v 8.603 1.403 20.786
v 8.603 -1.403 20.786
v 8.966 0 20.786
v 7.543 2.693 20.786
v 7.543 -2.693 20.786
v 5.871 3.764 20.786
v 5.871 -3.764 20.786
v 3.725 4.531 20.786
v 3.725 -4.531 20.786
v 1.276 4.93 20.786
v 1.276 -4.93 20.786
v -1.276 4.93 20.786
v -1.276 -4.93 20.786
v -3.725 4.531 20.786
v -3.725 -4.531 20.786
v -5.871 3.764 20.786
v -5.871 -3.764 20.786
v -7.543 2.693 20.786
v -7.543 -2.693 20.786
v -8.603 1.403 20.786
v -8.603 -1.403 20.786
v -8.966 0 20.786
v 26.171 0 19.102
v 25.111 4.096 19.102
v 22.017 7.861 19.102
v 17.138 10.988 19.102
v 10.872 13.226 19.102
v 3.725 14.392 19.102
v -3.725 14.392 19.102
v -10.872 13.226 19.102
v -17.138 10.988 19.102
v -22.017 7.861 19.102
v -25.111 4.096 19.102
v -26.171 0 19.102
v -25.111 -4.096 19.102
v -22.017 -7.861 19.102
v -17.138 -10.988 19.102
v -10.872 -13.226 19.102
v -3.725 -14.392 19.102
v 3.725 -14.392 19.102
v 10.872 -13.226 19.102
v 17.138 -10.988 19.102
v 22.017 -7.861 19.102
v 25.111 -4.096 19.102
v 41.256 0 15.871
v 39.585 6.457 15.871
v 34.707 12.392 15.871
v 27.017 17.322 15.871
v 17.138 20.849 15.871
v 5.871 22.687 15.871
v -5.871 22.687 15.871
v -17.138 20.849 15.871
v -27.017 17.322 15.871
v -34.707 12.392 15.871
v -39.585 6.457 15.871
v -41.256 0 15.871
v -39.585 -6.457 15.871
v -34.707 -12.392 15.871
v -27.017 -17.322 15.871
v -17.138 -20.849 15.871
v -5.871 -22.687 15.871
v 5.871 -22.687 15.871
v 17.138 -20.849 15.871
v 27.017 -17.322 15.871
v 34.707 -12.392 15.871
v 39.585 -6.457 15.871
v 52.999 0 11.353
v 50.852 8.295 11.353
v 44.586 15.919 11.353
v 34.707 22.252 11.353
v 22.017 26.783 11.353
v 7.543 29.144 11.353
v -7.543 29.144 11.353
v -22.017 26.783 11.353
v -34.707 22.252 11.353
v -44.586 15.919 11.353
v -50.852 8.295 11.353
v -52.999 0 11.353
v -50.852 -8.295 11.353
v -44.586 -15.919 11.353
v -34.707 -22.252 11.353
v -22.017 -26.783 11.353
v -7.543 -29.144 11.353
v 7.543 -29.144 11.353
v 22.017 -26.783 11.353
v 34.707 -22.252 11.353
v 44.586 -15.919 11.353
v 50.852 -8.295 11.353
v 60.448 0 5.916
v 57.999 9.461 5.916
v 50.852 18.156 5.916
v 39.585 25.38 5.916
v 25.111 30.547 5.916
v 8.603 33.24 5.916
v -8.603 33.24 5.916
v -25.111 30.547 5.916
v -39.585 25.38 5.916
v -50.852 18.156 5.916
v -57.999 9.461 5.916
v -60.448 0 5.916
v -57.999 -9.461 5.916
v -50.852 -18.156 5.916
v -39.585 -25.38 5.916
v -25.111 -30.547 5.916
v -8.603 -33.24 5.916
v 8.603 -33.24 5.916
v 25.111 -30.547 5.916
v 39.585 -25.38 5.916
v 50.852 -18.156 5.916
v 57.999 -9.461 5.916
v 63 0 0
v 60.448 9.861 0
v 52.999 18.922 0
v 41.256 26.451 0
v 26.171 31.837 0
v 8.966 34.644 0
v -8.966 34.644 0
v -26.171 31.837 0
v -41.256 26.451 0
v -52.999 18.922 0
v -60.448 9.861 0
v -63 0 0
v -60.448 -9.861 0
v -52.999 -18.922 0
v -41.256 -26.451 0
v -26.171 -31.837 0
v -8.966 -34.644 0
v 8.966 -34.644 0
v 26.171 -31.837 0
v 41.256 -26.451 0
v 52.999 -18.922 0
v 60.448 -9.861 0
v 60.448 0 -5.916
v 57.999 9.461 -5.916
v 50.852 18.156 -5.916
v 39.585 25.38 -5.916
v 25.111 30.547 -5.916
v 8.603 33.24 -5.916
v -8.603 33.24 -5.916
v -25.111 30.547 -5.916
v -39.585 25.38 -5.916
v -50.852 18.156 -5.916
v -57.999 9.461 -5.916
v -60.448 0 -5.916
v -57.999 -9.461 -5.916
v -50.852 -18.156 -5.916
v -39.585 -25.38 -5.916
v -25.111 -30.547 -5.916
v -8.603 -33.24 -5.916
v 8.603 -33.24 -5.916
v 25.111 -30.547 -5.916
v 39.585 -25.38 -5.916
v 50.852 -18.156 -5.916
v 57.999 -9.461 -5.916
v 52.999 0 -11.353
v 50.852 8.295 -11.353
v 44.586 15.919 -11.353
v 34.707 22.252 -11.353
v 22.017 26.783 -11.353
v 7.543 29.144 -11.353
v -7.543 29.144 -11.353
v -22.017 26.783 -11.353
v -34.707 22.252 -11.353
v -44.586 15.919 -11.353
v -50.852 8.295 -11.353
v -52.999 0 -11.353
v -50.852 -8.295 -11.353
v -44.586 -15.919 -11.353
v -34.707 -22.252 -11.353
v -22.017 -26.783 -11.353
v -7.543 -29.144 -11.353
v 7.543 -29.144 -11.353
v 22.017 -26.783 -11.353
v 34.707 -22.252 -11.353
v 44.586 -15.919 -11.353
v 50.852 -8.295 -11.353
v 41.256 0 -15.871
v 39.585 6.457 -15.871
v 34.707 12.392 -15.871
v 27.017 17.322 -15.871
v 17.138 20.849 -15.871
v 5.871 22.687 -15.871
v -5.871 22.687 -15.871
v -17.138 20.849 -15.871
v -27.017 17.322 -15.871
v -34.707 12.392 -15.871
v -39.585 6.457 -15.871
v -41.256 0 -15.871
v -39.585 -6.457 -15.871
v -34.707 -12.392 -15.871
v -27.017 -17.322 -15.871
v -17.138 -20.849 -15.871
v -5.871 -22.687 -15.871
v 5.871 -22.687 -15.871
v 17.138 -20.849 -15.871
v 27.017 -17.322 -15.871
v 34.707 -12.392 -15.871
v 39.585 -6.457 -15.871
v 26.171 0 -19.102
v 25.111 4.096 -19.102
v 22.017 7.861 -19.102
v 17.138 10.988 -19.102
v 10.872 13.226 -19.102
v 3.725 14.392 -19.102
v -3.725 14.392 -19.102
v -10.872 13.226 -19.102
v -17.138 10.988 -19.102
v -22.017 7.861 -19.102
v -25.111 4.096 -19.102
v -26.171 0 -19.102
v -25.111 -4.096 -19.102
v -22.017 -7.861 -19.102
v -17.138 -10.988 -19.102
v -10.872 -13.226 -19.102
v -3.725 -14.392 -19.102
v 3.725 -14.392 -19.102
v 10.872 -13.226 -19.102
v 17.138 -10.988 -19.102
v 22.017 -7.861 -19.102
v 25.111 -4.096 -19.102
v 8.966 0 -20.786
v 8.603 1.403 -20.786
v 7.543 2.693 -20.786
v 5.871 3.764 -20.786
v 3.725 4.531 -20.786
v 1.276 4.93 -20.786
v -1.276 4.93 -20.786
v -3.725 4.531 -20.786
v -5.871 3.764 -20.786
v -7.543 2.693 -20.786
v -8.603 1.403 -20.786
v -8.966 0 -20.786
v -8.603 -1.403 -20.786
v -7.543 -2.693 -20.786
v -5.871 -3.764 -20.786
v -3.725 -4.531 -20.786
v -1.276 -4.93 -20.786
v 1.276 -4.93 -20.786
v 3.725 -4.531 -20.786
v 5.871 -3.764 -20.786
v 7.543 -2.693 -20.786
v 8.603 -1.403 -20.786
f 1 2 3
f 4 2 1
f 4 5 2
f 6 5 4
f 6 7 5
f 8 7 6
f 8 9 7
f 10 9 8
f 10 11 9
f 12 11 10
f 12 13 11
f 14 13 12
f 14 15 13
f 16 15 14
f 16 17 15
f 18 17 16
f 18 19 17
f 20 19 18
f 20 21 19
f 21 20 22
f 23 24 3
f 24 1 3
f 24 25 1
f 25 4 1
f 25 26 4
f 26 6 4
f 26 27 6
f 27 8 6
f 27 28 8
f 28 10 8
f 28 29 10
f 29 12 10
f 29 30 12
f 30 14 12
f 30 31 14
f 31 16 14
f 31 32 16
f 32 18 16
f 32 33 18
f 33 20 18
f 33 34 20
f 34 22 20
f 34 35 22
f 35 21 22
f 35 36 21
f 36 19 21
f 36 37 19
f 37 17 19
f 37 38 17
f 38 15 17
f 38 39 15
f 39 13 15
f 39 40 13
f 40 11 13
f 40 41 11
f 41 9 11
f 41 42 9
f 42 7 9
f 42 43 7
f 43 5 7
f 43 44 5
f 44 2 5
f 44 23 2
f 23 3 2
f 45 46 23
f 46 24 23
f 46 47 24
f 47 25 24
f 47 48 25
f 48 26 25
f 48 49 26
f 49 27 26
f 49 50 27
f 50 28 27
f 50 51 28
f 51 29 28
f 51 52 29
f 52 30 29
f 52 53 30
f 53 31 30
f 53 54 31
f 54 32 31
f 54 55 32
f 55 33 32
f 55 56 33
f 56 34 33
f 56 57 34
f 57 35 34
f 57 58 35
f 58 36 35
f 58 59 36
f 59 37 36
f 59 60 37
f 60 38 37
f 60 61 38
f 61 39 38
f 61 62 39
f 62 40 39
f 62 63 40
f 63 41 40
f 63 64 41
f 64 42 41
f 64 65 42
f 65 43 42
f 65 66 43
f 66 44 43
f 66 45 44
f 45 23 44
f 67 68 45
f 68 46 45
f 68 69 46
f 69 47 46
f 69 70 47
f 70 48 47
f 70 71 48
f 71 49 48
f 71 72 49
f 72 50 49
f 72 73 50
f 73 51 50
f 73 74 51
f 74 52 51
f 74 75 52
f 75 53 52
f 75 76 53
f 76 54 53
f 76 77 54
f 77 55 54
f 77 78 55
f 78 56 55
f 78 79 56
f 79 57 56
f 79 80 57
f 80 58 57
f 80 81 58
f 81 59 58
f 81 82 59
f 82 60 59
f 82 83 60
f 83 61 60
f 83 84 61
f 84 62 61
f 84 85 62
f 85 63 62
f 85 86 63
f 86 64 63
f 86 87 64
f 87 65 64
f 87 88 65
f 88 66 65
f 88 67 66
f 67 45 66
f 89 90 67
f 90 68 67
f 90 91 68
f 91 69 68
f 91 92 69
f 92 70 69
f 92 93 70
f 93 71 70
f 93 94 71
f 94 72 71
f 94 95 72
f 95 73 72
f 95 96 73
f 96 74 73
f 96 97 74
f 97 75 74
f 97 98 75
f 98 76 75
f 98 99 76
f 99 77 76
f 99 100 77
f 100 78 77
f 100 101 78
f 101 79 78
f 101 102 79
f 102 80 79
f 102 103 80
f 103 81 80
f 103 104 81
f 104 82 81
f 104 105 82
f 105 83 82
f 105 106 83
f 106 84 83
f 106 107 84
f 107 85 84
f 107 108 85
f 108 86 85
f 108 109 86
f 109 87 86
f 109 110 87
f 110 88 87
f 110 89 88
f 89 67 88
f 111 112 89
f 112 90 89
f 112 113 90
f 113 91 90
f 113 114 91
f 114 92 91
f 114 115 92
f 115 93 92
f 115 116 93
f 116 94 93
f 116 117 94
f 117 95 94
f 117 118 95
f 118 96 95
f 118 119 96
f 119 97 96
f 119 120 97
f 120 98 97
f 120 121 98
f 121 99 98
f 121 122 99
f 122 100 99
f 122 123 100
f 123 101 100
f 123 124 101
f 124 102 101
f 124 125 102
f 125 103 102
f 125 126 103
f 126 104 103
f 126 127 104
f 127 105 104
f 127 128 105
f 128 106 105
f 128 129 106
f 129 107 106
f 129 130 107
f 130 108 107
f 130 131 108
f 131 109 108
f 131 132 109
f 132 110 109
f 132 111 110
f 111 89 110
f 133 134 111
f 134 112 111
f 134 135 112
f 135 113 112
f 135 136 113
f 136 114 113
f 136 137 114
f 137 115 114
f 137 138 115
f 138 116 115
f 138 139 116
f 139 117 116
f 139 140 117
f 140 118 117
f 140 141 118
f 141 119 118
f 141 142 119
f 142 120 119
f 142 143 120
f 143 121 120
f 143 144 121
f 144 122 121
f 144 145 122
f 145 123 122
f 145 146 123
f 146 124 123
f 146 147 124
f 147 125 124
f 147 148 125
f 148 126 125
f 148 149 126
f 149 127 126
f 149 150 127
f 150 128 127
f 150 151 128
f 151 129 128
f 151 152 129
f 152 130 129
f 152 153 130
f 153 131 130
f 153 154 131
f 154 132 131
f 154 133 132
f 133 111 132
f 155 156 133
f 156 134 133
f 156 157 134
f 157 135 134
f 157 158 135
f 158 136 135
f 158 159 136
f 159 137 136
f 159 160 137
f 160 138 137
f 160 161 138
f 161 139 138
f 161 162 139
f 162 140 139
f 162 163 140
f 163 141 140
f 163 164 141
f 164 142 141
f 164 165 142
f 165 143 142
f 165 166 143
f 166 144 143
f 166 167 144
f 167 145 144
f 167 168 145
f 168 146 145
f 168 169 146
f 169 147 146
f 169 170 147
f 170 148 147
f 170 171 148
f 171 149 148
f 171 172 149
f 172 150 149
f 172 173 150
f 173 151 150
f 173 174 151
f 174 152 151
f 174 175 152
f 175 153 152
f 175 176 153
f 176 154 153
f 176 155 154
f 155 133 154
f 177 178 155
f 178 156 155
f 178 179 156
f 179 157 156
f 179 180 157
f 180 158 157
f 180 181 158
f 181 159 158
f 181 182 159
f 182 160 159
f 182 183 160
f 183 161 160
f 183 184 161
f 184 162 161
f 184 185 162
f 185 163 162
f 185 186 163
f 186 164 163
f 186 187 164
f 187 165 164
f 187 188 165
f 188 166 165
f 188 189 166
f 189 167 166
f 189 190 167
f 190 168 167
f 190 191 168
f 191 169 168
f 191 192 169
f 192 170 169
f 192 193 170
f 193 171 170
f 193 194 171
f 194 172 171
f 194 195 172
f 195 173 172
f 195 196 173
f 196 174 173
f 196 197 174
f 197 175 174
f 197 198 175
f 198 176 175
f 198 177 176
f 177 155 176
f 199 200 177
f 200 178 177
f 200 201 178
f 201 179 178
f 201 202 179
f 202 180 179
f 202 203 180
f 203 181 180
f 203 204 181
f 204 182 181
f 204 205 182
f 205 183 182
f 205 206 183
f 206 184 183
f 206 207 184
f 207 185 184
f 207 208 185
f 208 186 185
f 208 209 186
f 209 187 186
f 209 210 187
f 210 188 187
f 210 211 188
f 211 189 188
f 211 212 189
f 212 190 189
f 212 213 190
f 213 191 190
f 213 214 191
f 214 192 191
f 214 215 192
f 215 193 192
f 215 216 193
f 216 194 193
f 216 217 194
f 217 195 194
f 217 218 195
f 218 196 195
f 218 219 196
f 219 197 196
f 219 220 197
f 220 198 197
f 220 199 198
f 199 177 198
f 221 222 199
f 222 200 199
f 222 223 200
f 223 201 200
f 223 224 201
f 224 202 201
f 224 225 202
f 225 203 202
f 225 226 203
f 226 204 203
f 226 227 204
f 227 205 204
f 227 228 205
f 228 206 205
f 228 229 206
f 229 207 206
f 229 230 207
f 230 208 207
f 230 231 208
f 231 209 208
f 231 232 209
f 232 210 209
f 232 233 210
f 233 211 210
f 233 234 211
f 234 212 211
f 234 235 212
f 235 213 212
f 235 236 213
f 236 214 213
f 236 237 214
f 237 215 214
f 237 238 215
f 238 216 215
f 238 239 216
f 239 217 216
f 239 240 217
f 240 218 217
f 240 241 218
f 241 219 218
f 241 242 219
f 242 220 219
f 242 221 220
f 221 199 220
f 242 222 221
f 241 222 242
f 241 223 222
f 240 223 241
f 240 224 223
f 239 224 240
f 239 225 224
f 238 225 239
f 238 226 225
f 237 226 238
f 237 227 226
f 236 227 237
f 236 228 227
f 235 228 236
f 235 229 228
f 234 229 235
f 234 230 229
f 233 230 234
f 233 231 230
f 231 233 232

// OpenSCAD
// Generated by SolidPython 1.0.1 on 2020-07-29 00:46:48


scale(v = [9, 5, 3]) {
	sphere(r = 7);
}
/***********************************************
*********      SolidPython code:      **********
************************************************
 
# import packages: SolidPython
from solid import *
from solid.utils import *
from itertools import chain, combinations, permutations


class Resize:

    def __init__(self, scad_file):
        self.scad_file = scad_file
        #self.scad_file = import_scad(scad_file)
        # cone/cylinder param:
        self.r1 = 0
        self.r2 = 0
        self.h = 0
        # rectangular prism param:
        self.w = 0
        self.l = 0
        # ellipse param:
        self.r = 0

    # import OpenScad code (file name corresponds to shape)


    # classify shape + parameters
    def assign(self, param1, param2, param3):
        if self.scad_file == 'cone.scad':
            self.r1 = param1
            self.r2 = param2
            self.h = param3
        elif self.scad_file == 'cylinder.scad':
            self.r1 = param1
            self.r2 = param2
            self.h = param3
        elif self.scad_file == 'rectangularPrism.scad':
            self.h = param1
            self.l = param2
            self.w = param3
        else:
            self.r = param1
            self.h = param2

    # resize parameters
    def iterate(self):
        x = range(3, 20, 2)
        i = 1
        if self.scad_file == 'cone.scad':
            tempList = list(permutations(x, 2))
            for temp in tempList:
                param1 = temp[0]
                param2 = temp[1]
                filepath = 'produced_scad_files/' + 'cone' + str(param1) + '_' + str(param2) + '_' + '.scad'
                scad_render_to_file(cylinder(h=param1, r1=param2, r2=0), filepath)

        elif self.scad_file == 'cylinder.scad':
            tempList = list(permutations(x, 3))
            for temp in tempList:
                param1 = temp[0]
                param2 = temp[1]
                filepath = 'produced_scad_files/' + 'cylinder' + str(param1) + '_' + str(param2) + '_' + '.scad'
                scad_render_to_file(cylinder(h=param1, r1=param2, r2=param2), filepath)

        elif self.scad_file == 'rectangularPrism.scad':
            tempList = list(permutations(x, 3))
            for temp in tempList:
                param1 = temp[0]
                param2 = temp[1]
                param3 = temp[2]
                filepath = 'produced_scad_files/' + 'rectangularPrism' + str(param1) + '_' + str(param2) + '_' + str(
                    param3) + '.scad'
                scad_render_to_file(cube(size=(param1, param2, param3)), filepath)

        elif self.scad_file == 'ellipse.scad':
            tempList = list(permutations(x, 4))
            for temp in tempList:
                param1 = temp[0]
                param2 = temp[1]
                param3 = temp[2]
                param4 = temp[3]
                filepath = 'produced_scad_files/' + 'ellipse' + str(param1) + '_' + str(param2) + '_' + str(param3) + '_' + str(param4) + '.scad'
                scad_render_to_file(scale([param1, param2, param3])(sphere(r=param4)), filepath)

    def render_to_scadfile(self):
        scad_render_to_file(scad, 'example.scad') 
 
************************************************/
